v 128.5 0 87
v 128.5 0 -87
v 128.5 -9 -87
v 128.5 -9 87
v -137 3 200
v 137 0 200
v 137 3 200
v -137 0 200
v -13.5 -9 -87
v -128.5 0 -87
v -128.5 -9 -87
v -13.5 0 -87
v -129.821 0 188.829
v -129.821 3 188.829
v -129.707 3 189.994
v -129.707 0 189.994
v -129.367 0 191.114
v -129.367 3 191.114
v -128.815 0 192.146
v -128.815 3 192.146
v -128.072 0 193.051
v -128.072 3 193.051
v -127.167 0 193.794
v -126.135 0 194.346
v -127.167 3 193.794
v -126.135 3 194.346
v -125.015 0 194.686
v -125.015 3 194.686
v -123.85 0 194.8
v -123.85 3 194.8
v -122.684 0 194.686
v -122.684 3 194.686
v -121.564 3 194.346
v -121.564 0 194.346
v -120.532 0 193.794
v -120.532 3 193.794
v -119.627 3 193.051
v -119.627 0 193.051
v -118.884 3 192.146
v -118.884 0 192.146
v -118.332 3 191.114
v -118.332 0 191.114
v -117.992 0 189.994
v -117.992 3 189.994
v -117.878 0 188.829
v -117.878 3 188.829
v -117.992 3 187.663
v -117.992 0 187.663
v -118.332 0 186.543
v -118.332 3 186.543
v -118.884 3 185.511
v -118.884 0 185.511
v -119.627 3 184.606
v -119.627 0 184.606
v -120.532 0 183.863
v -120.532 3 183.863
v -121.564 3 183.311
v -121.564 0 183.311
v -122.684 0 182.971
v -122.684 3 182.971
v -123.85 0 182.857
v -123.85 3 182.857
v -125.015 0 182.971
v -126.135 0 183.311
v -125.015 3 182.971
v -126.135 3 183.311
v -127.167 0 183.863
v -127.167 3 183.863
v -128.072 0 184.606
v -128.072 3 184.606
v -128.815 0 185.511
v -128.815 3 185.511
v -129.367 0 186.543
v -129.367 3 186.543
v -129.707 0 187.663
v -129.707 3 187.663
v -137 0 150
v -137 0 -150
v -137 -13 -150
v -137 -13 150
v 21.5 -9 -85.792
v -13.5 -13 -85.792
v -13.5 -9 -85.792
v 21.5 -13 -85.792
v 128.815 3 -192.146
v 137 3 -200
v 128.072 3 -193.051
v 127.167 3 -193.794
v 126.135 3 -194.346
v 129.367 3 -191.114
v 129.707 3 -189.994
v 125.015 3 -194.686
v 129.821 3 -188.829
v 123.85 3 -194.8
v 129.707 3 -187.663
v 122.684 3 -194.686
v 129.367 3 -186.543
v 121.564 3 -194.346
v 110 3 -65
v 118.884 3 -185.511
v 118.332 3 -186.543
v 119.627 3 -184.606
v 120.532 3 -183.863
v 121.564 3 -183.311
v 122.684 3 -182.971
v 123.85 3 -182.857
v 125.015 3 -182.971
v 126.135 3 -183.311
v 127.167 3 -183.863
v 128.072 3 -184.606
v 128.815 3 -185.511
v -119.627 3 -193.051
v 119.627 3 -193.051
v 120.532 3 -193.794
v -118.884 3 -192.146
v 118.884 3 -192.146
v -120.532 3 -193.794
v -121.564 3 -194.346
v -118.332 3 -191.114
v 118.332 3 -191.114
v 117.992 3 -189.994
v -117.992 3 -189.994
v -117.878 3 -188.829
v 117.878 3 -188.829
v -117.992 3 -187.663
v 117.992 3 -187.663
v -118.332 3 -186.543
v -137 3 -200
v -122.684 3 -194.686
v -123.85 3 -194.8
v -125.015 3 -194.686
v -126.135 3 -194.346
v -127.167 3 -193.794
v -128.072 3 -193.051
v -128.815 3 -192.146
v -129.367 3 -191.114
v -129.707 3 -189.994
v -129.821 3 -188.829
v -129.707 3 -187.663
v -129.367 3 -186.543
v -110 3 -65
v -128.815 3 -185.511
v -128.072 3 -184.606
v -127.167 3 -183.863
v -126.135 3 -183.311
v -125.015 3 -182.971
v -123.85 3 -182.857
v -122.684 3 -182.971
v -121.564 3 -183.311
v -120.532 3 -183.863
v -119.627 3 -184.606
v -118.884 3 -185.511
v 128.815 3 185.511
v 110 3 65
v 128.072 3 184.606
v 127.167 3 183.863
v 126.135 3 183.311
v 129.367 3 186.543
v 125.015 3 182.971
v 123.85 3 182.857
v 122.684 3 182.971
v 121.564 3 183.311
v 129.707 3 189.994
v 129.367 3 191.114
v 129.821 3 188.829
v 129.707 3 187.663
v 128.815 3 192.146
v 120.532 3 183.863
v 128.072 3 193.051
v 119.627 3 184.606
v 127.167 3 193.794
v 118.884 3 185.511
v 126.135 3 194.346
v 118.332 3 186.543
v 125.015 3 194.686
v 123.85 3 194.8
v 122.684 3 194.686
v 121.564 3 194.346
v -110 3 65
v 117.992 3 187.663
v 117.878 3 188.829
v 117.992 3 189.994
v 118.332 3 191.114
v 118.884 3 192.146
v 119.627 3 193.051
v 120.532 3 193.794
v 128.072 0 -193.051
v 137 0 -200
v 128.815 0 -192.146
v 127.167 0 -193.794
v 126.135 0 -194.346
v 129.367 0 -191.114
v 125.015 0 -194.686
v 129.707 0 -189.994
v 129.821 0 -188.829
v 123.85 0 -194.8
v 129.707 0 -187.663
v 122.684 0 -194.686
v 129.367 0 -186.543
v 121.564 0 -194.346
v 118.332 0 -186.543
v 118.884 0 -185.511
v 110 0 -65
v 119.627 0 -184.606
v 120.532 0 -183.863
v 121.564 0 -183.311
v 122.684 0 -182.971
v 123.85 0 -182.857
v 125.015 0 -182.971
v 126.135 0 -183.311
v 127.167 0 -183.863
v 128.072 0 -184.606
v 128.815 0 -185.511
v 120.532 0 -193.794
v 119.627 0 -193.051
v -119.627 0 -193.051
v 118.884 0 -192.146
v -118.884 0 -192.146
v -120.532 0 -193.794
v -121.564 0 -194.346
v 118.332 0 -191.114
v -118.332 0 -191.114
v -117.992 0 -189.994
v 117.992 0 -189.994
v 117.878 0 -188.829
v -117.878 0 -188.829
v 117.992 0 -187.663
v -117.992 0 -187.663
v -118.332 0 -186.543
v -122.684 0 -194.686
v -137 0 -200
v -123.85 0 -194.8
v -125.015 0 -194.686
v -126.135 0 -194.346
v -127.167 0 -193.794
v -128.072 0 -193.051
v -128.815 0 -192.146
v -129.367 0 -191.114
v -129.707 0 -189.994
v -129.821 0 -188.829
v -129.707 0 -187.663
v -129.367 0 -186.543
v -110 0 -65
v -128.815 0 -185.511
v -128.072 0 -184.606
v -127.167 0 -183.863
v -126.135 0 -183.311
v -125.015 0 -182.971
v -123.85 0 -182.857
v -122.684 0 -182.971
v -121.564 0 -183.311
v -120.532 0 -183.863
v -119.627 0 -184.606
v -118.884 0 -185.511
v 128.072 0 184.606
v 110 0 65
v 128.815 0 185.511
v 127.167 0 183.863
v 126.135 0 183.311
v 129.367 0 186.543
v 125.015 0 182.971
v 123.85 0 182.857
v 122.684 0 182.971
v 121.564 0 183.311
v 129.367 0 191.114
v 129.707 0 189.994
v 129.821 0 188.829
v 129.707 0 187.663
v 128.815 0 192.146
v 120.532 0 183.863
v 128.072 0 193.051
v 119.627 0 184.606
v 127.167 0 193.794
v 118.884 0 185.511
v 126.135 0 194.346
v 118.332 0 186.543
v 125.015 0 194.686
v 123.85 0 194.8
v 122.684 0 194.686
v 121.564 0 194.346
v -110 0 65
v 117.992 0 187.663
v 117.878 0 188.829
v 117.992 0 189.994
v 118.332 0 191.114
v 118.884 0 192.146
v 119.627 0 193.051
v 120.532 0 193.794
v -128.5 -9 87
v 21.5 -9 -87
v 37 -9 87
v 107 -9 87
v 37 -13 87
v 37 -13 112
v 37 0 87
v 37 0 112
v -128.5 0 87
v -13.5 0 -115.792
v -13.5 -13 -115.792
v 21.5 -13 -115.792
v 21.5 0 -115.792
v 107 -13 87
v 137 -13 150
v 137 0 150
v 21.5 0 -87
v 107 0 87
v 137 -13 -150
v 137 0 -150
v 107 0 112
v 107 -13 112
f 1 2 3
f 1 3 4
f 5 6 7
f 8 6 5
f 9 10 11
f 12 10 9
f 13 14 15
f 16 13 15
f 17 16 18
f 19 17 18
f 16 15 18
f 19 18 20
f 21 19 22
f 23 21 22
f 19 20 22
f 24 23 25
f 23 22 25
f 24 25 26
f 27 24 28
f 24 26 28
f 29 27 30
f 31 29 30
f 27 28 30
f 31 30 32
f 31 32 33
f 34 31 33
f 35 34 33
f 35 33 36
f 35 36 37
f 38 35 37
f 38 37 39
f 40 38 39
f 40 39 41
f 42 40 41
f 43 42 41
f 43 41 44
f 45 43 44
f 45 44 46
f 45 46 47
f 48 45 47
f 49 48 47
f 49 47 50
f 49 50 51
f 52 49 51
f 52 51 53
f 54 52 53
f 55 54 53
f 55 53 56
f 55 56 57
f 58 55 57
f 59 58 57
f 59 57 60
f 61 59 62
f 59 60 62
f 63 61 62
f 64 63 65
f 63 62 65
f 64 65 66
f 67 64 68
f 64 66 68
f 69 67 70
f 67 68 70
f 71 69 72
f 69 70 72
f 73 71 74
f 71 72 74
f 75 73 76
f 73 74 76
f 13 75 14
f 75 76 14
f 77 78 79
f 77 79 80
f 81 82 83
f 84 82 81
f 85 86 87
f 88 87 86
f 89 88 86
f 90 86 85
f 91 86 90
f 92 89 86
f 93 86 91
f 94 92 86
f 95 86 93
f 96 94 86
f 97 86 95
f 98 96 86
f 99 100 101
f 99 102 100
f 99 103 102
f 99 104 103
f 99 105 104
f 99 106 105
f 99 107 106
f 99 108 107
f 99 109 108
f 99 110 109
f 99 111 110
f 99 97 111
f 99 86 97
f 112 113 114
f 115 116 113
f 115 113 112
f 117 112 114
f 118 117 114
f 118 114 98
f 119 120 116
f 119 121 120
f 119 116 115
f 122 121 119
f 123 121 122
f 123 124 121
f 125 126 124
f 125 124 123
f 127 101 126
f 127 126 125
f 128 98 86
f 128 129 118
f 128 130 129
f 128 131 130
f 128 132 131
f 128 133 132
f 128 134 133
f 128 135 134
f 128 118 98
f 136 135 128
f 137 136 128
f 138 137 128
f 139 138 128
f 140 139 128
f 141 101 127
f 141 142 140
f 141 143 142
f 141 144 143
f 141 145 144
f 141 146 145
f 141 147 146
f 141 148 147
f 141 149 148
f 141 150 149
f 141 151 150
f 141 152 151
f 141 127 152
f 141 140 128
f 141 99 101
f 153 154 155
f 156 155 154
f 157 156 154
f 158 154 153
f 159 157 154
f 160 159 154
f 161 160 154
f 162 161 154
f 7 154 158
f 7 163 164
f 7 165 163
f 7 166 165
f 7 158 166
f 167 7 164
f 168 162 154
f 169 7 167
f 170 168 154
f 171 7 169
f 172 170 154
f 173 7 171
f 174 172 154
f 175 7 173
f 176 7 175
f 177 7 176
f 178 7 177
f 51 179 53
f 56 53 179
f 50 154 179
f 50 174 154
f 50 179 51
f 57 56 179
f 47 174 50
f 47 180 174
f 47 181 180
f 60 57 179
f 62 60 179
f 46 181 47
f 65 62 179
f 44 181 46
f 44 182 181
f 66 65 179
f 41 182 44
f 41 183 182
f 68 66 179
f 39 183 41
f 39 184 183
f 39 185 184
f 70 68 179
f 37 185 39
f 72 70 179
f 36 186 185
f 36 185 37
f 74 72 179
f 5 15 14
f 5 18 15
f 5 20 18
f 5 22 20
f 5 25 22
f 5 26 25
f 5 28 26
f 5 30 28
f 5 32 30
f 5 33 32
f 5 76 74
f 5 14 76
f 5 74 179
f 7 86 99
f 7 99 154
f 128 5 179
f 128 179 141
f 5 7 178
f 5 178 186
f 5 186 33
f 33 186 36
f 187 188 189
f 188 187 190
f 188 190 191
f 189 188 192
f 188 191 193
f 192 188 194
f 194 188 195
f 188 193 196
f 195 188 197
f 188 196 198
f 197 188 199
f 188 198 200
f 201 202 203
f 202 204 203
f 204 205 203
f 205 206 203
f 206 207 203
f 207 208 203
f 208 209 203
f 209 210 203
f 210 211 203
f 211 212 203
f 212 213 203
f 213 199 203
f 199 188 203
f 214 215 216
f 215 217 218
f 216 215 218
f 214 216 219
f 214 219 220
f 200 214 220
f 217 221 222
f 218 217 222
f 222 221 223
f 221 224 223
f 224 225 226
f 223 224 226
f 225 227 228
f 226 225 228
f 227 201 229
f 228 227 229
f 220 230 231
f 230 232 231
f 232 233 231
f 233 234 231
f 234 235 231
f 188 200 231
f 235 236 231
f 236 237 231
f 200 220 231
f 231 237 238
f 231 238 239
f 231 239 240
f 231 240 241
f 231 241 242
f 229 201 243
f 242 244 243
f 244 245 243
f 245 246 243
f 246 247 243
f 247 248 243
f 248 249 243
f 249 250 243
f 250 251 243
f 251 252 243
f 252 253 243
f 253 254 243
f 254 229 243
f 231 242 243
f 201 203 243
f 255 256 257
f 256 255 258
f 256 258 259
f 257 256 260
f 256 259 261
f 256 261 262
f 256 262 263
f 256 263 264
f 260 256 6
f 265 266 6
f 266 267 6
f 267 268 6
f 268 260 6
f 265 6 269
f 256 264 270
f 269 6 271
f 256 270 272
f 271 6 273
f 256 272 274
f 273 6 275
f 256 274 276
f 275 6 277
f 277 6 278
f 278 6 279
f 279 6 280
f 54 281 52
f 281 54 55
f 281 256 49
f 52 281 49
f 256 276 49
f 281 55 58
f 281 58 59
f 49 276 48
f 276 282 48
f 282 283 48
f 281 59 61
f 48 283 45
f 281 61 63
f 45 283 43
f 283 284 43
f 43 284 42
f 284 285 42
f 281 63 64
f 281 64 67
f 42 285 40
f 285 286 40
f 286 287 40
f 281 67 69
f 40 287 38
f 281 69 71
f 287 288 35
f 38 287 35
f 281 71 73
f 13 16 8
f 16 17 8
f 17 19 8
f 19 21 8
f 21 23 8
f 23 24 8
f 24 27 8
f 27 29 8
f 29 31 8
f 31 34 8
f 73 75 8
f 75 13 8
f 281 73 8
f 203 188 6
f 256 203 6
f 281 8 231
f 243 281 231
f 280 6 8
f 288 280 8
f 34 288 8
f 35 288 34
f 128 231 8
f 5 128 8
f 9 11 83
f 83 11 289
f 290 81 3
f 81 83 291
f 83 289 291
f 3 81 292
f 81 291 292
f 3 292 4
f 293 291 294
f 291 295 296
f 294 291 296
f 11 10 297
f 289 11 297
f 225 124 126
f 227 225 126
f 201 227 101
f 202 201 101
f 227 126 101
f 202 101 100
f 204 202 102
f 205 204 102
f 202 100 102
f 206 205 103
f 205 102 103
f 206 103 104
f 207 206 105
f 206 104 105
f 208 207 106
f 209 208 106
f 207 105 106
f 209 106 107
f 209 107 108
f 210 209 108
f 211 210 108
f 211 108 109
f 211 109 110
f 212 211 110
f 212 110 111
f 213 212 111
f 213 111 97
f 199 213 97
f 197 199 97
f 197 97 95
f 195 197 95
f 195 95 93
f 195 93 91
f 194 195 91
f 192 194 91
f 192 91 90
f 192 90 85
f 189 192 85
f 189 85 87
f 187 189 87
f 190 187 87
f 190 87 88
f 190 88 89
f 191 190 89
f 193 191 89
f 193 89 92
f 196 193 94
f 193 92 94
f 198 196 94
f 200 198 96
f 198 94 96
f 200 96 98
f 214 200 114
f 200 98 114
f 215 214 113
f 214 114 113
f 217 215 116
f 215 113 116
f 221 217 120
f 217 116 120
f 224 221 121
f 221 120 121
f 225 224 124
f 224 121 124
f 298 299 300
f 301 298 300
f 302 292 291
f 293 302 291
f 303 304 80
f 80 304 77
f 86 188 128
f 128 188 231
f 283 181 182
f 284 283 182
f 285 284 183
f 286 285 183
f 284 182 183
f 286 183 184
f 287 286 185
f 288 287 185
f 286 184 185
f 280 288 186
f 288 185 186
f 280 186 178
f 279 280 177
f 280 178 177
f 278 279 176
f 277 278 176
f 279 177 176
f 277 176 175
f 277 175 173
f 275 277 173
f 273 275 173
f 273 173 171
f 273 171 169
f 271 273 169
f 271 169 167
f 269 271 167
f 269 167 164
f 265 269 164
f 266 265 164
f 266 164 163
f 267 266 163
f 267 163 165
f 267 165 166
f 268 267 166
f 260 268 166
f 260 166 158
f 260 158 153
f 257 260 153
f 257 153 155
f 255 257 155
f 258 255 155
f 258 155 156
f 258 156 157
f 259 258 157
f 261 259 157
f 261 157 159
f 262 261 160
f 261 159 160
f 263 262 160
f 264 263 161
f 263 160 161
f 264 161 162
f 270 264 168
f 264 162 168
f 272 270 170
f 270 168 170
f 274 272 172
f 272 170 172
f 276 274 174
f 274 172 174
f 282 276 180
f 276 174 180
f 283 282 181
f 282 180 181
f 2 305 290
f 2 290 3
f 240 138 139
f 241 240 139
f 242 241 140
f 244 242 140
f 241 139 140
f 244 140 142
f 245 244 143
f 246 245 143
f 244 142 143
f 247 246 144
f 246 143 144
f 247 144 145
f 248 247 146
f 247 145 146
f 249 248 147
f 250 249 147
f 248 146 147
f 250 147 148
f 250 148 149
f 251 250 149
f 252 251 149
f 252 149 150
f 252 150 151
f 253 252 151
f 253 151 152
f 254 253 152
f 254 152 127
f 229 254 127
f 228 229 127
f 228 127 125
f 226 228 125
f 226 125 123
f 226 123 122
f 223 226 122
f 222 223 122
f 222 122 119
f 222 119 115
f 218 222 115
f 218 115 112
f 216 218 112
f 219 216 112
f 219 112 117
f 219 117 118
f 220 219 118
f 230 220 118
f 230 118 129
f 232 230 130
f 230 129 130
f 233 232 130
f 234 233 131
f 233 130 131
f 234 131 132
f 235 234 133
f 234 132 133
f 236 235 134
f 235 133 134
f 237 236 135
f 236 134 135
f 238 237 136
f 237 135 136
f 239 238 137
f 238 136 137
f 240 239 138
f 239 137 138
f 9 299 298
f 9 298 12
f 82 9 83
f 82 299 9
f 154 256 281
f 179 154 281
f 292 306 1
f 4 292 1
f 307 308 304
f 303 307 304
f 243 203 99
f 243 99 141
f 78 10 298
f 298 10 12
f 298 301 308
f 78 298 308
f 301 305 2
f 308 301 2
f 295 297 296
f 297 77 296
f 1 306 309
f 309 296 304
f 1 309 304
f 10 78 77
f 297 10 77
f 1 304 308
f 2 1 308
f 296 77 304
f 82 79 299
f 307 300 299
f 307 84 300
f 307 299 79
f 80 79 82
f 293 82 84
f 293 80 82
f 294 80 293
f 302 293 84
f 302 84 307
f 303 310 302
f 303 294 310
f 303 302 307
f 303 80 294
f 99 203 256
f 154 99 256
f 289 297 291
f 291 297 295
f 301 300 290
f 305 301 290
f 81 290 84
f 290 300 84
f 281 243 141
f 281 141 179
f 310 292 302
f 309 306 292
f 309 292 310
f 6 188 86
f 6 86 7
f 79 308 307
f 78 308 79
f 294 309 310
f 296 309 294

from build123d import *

# Parameters (mm, degrees)
F0_W      = 274
F0_H      = 400
F2_DEPTH  = 13
F1_W      = 257
F1_H      = 174
F3_DEPTH  = 9
F4_W      = 274
F4_H      = 400
F4_W_2    = 220
F4_H_2    = 130
F5_DEPTH  = 3
F6_W      = 272.697836
F6_H      = 207.733818
F7_DEPTH  = 3
F9_W      = 35
F9_H      = 30
F10_DEPTH = 13
F11_W     = 70
F11_H     = 25
F12_DEPTH = 13
F13_R     = 5.97192
F14_DEPTH = 16.001
F15_DEPTH = 25
F16_DEPTH = 25
F17_DEPTH = 25
F18_W     = 274
F18_H     = 50
F19_DEPTH = 13.001


with BuildPart() as f2:
    # F0 (on Front) → F2 (new body)
    with BuildSketch(Plane.XZ):
        Rectangle(F0_W, F0_H)
    extrude(amount=F2_DEPTH)

    # F1 (on face) → F3 (cut)
    with BuildSketch(Plane.XZ):
        Rectangle(F1_W, F1_H)
    extrude(amount=F3_DEPTH, mode=Mode.SUBTRACT)

    # F9 (on face) → F10 (cut)
    with BuildSketch(Plane.XZ.offset(13)):
        with Locations((4, -100.792492)):
            Rectangle(F9_W, F9_H)
    extrude(amount=-F10_DEPTH, mode=Mode.SUBTRACT)

    # F11 (on face) → F12 (cut)
    with BuildSketch(Plane(origin=(0, 0, 0), x_dir=(-1, 0, 0), z_dir=(0, 1, 0))):
        with Locations((-72, 99.5)):
            Rectangle(F11_W, F11_H)
    extrude(amount=-F12_DEPTH, mode=Mode.SUBTRACT)


with BuildPart() as f5:
    # F4 (on face) → F5 (new body)
    with BuildSketch(Plane(origin=(0, 0, 0), x_dir=(-1, 0, 0), z_dir=(0, 1, 0))):
        Rectangle(F4_W, F4_H)
        Rectangle(F4_W_2, F4_H_2, mode=Mode.SUBTRACT)
    extrude(amount=F5_DEPTH)


with BuildPart() as f7:
    # F6 (on face) → F7 (new body)
    with BuildSketch(Plane(origin=(0, -9, 0), x_dir=(-1, 0, 0), z_dir=(0, 1, 0))):
        with Locations((-0.3777, 1.888495)):
            Rectangle(F6_W, F6_H)
    extrude(amount=F7_DEPTH)


with BuildPart() as f14_tool:
    # F13 (on face) → F14 (new body, through all)
    with BuildSketch(Plane(origin=(0, 3, 0), x_dir=(-1, 0, 0), z_dir=(0, 1, 0))):
        with Locations((-123.849541, 188.828528)):
            Circle(F13_R)
    extrude(amount=-F14_DEPTH)


with BuildPart() as f2_1:
    add(f2.part)

    # F14: cut by f14_tool
    add(f14_tool.part, mode=Mode.SUBTRACT)


with BuildPart() as f5_1:
    add(f5.part)

    # F14: cut by f14_tool
    add(f14_tool.part, mode=Mode.SUBTRACT)


with BuildPart() as f15_tool:
    # F13 (on face) → F15 (new body)
    with BuildSketch(Plane(origin=(0, 3, 0), x_dir=(-1, 0, 0), z_dir=(0, 1, 0))):
        with Locations((123.849541, 188.828528)):
            Circle(F13_R)
    extrude(amount=-F15_DEPTH)


with BuildPart() as f2_2:
    add(f2_1.part)

    # F15: cut by f15_tool
    add(f15_tool.part, mode=Mode.SUBTRACT)


with BuildPart() as f5_2:
    add(f5_1.part)

    # F15: cut by f15_tool
    add(f15_tool.part, mode=Mode.SUBTRACT)


with BuildPart() as f16_tool:
    # F13 (on face) → F16 (new body)
    with BuildSketch(Plane(origin=(0, 3, 0), x_dir=(-1, 0, 0), z_dir=(0, 1, 0))):
        with Locations((-123.849541, -188.828528)):
            Circle(F13_R)
    extrude(amount=-F16_DEPTH)


with BuildPart() as f2_3:
    add(f2_2.part)

    # F16: cut by f16_tool
    add(f16_tool.part, mode=Mode.SUBTRACT)


with BuildPart() as f5_3:
    add(f5_2.part)

    # F16: cut by f16_tool
    add(f16_tool.part, mode=Mode.SUBTRACT)


with BuildPart() as f17_tool:
    # F13 (on face) → F17 (new body)
    with BuildSketch(Plane(origin=(0, 3, 0), x_dir=(-1, 0, 0), z_dir=(0, 1, 0))):
        with Locations((123.849541, -188.828528)):
            Circle(F13_R)
    extrude(amount=-F17_DEPTH)


with BuildPart() as f2_4:
    add(f2_3.part)

    # F17: cut by f17_tool
    add(f17_tool.part, mode=Mode.SUBTRACT)

    # F18 (on face) → F19 (cut, through all)
    with BuildSketch(Plane(origin=(0, 0, 0), x_dir=(-1, 0, 0), z_dir=(0, 1, 0))):
        with Locations((0, 175)):
            Rectangle(F18_W, F18_H)
        with Locations((0, -175)):
            Rectangle(F18_W, F18_H)
    extrude(amount=-F19_DEPTH, mode=Mode.SUBTRACT)


with BuildPart() as f5_4:
    add(f5_3.part)

    # F17: cut by f17_tool
    add(f17_tool.part, mode=Mode.SUBTRACT)


solid = Compound([f2_4.part, f5_4.part])
